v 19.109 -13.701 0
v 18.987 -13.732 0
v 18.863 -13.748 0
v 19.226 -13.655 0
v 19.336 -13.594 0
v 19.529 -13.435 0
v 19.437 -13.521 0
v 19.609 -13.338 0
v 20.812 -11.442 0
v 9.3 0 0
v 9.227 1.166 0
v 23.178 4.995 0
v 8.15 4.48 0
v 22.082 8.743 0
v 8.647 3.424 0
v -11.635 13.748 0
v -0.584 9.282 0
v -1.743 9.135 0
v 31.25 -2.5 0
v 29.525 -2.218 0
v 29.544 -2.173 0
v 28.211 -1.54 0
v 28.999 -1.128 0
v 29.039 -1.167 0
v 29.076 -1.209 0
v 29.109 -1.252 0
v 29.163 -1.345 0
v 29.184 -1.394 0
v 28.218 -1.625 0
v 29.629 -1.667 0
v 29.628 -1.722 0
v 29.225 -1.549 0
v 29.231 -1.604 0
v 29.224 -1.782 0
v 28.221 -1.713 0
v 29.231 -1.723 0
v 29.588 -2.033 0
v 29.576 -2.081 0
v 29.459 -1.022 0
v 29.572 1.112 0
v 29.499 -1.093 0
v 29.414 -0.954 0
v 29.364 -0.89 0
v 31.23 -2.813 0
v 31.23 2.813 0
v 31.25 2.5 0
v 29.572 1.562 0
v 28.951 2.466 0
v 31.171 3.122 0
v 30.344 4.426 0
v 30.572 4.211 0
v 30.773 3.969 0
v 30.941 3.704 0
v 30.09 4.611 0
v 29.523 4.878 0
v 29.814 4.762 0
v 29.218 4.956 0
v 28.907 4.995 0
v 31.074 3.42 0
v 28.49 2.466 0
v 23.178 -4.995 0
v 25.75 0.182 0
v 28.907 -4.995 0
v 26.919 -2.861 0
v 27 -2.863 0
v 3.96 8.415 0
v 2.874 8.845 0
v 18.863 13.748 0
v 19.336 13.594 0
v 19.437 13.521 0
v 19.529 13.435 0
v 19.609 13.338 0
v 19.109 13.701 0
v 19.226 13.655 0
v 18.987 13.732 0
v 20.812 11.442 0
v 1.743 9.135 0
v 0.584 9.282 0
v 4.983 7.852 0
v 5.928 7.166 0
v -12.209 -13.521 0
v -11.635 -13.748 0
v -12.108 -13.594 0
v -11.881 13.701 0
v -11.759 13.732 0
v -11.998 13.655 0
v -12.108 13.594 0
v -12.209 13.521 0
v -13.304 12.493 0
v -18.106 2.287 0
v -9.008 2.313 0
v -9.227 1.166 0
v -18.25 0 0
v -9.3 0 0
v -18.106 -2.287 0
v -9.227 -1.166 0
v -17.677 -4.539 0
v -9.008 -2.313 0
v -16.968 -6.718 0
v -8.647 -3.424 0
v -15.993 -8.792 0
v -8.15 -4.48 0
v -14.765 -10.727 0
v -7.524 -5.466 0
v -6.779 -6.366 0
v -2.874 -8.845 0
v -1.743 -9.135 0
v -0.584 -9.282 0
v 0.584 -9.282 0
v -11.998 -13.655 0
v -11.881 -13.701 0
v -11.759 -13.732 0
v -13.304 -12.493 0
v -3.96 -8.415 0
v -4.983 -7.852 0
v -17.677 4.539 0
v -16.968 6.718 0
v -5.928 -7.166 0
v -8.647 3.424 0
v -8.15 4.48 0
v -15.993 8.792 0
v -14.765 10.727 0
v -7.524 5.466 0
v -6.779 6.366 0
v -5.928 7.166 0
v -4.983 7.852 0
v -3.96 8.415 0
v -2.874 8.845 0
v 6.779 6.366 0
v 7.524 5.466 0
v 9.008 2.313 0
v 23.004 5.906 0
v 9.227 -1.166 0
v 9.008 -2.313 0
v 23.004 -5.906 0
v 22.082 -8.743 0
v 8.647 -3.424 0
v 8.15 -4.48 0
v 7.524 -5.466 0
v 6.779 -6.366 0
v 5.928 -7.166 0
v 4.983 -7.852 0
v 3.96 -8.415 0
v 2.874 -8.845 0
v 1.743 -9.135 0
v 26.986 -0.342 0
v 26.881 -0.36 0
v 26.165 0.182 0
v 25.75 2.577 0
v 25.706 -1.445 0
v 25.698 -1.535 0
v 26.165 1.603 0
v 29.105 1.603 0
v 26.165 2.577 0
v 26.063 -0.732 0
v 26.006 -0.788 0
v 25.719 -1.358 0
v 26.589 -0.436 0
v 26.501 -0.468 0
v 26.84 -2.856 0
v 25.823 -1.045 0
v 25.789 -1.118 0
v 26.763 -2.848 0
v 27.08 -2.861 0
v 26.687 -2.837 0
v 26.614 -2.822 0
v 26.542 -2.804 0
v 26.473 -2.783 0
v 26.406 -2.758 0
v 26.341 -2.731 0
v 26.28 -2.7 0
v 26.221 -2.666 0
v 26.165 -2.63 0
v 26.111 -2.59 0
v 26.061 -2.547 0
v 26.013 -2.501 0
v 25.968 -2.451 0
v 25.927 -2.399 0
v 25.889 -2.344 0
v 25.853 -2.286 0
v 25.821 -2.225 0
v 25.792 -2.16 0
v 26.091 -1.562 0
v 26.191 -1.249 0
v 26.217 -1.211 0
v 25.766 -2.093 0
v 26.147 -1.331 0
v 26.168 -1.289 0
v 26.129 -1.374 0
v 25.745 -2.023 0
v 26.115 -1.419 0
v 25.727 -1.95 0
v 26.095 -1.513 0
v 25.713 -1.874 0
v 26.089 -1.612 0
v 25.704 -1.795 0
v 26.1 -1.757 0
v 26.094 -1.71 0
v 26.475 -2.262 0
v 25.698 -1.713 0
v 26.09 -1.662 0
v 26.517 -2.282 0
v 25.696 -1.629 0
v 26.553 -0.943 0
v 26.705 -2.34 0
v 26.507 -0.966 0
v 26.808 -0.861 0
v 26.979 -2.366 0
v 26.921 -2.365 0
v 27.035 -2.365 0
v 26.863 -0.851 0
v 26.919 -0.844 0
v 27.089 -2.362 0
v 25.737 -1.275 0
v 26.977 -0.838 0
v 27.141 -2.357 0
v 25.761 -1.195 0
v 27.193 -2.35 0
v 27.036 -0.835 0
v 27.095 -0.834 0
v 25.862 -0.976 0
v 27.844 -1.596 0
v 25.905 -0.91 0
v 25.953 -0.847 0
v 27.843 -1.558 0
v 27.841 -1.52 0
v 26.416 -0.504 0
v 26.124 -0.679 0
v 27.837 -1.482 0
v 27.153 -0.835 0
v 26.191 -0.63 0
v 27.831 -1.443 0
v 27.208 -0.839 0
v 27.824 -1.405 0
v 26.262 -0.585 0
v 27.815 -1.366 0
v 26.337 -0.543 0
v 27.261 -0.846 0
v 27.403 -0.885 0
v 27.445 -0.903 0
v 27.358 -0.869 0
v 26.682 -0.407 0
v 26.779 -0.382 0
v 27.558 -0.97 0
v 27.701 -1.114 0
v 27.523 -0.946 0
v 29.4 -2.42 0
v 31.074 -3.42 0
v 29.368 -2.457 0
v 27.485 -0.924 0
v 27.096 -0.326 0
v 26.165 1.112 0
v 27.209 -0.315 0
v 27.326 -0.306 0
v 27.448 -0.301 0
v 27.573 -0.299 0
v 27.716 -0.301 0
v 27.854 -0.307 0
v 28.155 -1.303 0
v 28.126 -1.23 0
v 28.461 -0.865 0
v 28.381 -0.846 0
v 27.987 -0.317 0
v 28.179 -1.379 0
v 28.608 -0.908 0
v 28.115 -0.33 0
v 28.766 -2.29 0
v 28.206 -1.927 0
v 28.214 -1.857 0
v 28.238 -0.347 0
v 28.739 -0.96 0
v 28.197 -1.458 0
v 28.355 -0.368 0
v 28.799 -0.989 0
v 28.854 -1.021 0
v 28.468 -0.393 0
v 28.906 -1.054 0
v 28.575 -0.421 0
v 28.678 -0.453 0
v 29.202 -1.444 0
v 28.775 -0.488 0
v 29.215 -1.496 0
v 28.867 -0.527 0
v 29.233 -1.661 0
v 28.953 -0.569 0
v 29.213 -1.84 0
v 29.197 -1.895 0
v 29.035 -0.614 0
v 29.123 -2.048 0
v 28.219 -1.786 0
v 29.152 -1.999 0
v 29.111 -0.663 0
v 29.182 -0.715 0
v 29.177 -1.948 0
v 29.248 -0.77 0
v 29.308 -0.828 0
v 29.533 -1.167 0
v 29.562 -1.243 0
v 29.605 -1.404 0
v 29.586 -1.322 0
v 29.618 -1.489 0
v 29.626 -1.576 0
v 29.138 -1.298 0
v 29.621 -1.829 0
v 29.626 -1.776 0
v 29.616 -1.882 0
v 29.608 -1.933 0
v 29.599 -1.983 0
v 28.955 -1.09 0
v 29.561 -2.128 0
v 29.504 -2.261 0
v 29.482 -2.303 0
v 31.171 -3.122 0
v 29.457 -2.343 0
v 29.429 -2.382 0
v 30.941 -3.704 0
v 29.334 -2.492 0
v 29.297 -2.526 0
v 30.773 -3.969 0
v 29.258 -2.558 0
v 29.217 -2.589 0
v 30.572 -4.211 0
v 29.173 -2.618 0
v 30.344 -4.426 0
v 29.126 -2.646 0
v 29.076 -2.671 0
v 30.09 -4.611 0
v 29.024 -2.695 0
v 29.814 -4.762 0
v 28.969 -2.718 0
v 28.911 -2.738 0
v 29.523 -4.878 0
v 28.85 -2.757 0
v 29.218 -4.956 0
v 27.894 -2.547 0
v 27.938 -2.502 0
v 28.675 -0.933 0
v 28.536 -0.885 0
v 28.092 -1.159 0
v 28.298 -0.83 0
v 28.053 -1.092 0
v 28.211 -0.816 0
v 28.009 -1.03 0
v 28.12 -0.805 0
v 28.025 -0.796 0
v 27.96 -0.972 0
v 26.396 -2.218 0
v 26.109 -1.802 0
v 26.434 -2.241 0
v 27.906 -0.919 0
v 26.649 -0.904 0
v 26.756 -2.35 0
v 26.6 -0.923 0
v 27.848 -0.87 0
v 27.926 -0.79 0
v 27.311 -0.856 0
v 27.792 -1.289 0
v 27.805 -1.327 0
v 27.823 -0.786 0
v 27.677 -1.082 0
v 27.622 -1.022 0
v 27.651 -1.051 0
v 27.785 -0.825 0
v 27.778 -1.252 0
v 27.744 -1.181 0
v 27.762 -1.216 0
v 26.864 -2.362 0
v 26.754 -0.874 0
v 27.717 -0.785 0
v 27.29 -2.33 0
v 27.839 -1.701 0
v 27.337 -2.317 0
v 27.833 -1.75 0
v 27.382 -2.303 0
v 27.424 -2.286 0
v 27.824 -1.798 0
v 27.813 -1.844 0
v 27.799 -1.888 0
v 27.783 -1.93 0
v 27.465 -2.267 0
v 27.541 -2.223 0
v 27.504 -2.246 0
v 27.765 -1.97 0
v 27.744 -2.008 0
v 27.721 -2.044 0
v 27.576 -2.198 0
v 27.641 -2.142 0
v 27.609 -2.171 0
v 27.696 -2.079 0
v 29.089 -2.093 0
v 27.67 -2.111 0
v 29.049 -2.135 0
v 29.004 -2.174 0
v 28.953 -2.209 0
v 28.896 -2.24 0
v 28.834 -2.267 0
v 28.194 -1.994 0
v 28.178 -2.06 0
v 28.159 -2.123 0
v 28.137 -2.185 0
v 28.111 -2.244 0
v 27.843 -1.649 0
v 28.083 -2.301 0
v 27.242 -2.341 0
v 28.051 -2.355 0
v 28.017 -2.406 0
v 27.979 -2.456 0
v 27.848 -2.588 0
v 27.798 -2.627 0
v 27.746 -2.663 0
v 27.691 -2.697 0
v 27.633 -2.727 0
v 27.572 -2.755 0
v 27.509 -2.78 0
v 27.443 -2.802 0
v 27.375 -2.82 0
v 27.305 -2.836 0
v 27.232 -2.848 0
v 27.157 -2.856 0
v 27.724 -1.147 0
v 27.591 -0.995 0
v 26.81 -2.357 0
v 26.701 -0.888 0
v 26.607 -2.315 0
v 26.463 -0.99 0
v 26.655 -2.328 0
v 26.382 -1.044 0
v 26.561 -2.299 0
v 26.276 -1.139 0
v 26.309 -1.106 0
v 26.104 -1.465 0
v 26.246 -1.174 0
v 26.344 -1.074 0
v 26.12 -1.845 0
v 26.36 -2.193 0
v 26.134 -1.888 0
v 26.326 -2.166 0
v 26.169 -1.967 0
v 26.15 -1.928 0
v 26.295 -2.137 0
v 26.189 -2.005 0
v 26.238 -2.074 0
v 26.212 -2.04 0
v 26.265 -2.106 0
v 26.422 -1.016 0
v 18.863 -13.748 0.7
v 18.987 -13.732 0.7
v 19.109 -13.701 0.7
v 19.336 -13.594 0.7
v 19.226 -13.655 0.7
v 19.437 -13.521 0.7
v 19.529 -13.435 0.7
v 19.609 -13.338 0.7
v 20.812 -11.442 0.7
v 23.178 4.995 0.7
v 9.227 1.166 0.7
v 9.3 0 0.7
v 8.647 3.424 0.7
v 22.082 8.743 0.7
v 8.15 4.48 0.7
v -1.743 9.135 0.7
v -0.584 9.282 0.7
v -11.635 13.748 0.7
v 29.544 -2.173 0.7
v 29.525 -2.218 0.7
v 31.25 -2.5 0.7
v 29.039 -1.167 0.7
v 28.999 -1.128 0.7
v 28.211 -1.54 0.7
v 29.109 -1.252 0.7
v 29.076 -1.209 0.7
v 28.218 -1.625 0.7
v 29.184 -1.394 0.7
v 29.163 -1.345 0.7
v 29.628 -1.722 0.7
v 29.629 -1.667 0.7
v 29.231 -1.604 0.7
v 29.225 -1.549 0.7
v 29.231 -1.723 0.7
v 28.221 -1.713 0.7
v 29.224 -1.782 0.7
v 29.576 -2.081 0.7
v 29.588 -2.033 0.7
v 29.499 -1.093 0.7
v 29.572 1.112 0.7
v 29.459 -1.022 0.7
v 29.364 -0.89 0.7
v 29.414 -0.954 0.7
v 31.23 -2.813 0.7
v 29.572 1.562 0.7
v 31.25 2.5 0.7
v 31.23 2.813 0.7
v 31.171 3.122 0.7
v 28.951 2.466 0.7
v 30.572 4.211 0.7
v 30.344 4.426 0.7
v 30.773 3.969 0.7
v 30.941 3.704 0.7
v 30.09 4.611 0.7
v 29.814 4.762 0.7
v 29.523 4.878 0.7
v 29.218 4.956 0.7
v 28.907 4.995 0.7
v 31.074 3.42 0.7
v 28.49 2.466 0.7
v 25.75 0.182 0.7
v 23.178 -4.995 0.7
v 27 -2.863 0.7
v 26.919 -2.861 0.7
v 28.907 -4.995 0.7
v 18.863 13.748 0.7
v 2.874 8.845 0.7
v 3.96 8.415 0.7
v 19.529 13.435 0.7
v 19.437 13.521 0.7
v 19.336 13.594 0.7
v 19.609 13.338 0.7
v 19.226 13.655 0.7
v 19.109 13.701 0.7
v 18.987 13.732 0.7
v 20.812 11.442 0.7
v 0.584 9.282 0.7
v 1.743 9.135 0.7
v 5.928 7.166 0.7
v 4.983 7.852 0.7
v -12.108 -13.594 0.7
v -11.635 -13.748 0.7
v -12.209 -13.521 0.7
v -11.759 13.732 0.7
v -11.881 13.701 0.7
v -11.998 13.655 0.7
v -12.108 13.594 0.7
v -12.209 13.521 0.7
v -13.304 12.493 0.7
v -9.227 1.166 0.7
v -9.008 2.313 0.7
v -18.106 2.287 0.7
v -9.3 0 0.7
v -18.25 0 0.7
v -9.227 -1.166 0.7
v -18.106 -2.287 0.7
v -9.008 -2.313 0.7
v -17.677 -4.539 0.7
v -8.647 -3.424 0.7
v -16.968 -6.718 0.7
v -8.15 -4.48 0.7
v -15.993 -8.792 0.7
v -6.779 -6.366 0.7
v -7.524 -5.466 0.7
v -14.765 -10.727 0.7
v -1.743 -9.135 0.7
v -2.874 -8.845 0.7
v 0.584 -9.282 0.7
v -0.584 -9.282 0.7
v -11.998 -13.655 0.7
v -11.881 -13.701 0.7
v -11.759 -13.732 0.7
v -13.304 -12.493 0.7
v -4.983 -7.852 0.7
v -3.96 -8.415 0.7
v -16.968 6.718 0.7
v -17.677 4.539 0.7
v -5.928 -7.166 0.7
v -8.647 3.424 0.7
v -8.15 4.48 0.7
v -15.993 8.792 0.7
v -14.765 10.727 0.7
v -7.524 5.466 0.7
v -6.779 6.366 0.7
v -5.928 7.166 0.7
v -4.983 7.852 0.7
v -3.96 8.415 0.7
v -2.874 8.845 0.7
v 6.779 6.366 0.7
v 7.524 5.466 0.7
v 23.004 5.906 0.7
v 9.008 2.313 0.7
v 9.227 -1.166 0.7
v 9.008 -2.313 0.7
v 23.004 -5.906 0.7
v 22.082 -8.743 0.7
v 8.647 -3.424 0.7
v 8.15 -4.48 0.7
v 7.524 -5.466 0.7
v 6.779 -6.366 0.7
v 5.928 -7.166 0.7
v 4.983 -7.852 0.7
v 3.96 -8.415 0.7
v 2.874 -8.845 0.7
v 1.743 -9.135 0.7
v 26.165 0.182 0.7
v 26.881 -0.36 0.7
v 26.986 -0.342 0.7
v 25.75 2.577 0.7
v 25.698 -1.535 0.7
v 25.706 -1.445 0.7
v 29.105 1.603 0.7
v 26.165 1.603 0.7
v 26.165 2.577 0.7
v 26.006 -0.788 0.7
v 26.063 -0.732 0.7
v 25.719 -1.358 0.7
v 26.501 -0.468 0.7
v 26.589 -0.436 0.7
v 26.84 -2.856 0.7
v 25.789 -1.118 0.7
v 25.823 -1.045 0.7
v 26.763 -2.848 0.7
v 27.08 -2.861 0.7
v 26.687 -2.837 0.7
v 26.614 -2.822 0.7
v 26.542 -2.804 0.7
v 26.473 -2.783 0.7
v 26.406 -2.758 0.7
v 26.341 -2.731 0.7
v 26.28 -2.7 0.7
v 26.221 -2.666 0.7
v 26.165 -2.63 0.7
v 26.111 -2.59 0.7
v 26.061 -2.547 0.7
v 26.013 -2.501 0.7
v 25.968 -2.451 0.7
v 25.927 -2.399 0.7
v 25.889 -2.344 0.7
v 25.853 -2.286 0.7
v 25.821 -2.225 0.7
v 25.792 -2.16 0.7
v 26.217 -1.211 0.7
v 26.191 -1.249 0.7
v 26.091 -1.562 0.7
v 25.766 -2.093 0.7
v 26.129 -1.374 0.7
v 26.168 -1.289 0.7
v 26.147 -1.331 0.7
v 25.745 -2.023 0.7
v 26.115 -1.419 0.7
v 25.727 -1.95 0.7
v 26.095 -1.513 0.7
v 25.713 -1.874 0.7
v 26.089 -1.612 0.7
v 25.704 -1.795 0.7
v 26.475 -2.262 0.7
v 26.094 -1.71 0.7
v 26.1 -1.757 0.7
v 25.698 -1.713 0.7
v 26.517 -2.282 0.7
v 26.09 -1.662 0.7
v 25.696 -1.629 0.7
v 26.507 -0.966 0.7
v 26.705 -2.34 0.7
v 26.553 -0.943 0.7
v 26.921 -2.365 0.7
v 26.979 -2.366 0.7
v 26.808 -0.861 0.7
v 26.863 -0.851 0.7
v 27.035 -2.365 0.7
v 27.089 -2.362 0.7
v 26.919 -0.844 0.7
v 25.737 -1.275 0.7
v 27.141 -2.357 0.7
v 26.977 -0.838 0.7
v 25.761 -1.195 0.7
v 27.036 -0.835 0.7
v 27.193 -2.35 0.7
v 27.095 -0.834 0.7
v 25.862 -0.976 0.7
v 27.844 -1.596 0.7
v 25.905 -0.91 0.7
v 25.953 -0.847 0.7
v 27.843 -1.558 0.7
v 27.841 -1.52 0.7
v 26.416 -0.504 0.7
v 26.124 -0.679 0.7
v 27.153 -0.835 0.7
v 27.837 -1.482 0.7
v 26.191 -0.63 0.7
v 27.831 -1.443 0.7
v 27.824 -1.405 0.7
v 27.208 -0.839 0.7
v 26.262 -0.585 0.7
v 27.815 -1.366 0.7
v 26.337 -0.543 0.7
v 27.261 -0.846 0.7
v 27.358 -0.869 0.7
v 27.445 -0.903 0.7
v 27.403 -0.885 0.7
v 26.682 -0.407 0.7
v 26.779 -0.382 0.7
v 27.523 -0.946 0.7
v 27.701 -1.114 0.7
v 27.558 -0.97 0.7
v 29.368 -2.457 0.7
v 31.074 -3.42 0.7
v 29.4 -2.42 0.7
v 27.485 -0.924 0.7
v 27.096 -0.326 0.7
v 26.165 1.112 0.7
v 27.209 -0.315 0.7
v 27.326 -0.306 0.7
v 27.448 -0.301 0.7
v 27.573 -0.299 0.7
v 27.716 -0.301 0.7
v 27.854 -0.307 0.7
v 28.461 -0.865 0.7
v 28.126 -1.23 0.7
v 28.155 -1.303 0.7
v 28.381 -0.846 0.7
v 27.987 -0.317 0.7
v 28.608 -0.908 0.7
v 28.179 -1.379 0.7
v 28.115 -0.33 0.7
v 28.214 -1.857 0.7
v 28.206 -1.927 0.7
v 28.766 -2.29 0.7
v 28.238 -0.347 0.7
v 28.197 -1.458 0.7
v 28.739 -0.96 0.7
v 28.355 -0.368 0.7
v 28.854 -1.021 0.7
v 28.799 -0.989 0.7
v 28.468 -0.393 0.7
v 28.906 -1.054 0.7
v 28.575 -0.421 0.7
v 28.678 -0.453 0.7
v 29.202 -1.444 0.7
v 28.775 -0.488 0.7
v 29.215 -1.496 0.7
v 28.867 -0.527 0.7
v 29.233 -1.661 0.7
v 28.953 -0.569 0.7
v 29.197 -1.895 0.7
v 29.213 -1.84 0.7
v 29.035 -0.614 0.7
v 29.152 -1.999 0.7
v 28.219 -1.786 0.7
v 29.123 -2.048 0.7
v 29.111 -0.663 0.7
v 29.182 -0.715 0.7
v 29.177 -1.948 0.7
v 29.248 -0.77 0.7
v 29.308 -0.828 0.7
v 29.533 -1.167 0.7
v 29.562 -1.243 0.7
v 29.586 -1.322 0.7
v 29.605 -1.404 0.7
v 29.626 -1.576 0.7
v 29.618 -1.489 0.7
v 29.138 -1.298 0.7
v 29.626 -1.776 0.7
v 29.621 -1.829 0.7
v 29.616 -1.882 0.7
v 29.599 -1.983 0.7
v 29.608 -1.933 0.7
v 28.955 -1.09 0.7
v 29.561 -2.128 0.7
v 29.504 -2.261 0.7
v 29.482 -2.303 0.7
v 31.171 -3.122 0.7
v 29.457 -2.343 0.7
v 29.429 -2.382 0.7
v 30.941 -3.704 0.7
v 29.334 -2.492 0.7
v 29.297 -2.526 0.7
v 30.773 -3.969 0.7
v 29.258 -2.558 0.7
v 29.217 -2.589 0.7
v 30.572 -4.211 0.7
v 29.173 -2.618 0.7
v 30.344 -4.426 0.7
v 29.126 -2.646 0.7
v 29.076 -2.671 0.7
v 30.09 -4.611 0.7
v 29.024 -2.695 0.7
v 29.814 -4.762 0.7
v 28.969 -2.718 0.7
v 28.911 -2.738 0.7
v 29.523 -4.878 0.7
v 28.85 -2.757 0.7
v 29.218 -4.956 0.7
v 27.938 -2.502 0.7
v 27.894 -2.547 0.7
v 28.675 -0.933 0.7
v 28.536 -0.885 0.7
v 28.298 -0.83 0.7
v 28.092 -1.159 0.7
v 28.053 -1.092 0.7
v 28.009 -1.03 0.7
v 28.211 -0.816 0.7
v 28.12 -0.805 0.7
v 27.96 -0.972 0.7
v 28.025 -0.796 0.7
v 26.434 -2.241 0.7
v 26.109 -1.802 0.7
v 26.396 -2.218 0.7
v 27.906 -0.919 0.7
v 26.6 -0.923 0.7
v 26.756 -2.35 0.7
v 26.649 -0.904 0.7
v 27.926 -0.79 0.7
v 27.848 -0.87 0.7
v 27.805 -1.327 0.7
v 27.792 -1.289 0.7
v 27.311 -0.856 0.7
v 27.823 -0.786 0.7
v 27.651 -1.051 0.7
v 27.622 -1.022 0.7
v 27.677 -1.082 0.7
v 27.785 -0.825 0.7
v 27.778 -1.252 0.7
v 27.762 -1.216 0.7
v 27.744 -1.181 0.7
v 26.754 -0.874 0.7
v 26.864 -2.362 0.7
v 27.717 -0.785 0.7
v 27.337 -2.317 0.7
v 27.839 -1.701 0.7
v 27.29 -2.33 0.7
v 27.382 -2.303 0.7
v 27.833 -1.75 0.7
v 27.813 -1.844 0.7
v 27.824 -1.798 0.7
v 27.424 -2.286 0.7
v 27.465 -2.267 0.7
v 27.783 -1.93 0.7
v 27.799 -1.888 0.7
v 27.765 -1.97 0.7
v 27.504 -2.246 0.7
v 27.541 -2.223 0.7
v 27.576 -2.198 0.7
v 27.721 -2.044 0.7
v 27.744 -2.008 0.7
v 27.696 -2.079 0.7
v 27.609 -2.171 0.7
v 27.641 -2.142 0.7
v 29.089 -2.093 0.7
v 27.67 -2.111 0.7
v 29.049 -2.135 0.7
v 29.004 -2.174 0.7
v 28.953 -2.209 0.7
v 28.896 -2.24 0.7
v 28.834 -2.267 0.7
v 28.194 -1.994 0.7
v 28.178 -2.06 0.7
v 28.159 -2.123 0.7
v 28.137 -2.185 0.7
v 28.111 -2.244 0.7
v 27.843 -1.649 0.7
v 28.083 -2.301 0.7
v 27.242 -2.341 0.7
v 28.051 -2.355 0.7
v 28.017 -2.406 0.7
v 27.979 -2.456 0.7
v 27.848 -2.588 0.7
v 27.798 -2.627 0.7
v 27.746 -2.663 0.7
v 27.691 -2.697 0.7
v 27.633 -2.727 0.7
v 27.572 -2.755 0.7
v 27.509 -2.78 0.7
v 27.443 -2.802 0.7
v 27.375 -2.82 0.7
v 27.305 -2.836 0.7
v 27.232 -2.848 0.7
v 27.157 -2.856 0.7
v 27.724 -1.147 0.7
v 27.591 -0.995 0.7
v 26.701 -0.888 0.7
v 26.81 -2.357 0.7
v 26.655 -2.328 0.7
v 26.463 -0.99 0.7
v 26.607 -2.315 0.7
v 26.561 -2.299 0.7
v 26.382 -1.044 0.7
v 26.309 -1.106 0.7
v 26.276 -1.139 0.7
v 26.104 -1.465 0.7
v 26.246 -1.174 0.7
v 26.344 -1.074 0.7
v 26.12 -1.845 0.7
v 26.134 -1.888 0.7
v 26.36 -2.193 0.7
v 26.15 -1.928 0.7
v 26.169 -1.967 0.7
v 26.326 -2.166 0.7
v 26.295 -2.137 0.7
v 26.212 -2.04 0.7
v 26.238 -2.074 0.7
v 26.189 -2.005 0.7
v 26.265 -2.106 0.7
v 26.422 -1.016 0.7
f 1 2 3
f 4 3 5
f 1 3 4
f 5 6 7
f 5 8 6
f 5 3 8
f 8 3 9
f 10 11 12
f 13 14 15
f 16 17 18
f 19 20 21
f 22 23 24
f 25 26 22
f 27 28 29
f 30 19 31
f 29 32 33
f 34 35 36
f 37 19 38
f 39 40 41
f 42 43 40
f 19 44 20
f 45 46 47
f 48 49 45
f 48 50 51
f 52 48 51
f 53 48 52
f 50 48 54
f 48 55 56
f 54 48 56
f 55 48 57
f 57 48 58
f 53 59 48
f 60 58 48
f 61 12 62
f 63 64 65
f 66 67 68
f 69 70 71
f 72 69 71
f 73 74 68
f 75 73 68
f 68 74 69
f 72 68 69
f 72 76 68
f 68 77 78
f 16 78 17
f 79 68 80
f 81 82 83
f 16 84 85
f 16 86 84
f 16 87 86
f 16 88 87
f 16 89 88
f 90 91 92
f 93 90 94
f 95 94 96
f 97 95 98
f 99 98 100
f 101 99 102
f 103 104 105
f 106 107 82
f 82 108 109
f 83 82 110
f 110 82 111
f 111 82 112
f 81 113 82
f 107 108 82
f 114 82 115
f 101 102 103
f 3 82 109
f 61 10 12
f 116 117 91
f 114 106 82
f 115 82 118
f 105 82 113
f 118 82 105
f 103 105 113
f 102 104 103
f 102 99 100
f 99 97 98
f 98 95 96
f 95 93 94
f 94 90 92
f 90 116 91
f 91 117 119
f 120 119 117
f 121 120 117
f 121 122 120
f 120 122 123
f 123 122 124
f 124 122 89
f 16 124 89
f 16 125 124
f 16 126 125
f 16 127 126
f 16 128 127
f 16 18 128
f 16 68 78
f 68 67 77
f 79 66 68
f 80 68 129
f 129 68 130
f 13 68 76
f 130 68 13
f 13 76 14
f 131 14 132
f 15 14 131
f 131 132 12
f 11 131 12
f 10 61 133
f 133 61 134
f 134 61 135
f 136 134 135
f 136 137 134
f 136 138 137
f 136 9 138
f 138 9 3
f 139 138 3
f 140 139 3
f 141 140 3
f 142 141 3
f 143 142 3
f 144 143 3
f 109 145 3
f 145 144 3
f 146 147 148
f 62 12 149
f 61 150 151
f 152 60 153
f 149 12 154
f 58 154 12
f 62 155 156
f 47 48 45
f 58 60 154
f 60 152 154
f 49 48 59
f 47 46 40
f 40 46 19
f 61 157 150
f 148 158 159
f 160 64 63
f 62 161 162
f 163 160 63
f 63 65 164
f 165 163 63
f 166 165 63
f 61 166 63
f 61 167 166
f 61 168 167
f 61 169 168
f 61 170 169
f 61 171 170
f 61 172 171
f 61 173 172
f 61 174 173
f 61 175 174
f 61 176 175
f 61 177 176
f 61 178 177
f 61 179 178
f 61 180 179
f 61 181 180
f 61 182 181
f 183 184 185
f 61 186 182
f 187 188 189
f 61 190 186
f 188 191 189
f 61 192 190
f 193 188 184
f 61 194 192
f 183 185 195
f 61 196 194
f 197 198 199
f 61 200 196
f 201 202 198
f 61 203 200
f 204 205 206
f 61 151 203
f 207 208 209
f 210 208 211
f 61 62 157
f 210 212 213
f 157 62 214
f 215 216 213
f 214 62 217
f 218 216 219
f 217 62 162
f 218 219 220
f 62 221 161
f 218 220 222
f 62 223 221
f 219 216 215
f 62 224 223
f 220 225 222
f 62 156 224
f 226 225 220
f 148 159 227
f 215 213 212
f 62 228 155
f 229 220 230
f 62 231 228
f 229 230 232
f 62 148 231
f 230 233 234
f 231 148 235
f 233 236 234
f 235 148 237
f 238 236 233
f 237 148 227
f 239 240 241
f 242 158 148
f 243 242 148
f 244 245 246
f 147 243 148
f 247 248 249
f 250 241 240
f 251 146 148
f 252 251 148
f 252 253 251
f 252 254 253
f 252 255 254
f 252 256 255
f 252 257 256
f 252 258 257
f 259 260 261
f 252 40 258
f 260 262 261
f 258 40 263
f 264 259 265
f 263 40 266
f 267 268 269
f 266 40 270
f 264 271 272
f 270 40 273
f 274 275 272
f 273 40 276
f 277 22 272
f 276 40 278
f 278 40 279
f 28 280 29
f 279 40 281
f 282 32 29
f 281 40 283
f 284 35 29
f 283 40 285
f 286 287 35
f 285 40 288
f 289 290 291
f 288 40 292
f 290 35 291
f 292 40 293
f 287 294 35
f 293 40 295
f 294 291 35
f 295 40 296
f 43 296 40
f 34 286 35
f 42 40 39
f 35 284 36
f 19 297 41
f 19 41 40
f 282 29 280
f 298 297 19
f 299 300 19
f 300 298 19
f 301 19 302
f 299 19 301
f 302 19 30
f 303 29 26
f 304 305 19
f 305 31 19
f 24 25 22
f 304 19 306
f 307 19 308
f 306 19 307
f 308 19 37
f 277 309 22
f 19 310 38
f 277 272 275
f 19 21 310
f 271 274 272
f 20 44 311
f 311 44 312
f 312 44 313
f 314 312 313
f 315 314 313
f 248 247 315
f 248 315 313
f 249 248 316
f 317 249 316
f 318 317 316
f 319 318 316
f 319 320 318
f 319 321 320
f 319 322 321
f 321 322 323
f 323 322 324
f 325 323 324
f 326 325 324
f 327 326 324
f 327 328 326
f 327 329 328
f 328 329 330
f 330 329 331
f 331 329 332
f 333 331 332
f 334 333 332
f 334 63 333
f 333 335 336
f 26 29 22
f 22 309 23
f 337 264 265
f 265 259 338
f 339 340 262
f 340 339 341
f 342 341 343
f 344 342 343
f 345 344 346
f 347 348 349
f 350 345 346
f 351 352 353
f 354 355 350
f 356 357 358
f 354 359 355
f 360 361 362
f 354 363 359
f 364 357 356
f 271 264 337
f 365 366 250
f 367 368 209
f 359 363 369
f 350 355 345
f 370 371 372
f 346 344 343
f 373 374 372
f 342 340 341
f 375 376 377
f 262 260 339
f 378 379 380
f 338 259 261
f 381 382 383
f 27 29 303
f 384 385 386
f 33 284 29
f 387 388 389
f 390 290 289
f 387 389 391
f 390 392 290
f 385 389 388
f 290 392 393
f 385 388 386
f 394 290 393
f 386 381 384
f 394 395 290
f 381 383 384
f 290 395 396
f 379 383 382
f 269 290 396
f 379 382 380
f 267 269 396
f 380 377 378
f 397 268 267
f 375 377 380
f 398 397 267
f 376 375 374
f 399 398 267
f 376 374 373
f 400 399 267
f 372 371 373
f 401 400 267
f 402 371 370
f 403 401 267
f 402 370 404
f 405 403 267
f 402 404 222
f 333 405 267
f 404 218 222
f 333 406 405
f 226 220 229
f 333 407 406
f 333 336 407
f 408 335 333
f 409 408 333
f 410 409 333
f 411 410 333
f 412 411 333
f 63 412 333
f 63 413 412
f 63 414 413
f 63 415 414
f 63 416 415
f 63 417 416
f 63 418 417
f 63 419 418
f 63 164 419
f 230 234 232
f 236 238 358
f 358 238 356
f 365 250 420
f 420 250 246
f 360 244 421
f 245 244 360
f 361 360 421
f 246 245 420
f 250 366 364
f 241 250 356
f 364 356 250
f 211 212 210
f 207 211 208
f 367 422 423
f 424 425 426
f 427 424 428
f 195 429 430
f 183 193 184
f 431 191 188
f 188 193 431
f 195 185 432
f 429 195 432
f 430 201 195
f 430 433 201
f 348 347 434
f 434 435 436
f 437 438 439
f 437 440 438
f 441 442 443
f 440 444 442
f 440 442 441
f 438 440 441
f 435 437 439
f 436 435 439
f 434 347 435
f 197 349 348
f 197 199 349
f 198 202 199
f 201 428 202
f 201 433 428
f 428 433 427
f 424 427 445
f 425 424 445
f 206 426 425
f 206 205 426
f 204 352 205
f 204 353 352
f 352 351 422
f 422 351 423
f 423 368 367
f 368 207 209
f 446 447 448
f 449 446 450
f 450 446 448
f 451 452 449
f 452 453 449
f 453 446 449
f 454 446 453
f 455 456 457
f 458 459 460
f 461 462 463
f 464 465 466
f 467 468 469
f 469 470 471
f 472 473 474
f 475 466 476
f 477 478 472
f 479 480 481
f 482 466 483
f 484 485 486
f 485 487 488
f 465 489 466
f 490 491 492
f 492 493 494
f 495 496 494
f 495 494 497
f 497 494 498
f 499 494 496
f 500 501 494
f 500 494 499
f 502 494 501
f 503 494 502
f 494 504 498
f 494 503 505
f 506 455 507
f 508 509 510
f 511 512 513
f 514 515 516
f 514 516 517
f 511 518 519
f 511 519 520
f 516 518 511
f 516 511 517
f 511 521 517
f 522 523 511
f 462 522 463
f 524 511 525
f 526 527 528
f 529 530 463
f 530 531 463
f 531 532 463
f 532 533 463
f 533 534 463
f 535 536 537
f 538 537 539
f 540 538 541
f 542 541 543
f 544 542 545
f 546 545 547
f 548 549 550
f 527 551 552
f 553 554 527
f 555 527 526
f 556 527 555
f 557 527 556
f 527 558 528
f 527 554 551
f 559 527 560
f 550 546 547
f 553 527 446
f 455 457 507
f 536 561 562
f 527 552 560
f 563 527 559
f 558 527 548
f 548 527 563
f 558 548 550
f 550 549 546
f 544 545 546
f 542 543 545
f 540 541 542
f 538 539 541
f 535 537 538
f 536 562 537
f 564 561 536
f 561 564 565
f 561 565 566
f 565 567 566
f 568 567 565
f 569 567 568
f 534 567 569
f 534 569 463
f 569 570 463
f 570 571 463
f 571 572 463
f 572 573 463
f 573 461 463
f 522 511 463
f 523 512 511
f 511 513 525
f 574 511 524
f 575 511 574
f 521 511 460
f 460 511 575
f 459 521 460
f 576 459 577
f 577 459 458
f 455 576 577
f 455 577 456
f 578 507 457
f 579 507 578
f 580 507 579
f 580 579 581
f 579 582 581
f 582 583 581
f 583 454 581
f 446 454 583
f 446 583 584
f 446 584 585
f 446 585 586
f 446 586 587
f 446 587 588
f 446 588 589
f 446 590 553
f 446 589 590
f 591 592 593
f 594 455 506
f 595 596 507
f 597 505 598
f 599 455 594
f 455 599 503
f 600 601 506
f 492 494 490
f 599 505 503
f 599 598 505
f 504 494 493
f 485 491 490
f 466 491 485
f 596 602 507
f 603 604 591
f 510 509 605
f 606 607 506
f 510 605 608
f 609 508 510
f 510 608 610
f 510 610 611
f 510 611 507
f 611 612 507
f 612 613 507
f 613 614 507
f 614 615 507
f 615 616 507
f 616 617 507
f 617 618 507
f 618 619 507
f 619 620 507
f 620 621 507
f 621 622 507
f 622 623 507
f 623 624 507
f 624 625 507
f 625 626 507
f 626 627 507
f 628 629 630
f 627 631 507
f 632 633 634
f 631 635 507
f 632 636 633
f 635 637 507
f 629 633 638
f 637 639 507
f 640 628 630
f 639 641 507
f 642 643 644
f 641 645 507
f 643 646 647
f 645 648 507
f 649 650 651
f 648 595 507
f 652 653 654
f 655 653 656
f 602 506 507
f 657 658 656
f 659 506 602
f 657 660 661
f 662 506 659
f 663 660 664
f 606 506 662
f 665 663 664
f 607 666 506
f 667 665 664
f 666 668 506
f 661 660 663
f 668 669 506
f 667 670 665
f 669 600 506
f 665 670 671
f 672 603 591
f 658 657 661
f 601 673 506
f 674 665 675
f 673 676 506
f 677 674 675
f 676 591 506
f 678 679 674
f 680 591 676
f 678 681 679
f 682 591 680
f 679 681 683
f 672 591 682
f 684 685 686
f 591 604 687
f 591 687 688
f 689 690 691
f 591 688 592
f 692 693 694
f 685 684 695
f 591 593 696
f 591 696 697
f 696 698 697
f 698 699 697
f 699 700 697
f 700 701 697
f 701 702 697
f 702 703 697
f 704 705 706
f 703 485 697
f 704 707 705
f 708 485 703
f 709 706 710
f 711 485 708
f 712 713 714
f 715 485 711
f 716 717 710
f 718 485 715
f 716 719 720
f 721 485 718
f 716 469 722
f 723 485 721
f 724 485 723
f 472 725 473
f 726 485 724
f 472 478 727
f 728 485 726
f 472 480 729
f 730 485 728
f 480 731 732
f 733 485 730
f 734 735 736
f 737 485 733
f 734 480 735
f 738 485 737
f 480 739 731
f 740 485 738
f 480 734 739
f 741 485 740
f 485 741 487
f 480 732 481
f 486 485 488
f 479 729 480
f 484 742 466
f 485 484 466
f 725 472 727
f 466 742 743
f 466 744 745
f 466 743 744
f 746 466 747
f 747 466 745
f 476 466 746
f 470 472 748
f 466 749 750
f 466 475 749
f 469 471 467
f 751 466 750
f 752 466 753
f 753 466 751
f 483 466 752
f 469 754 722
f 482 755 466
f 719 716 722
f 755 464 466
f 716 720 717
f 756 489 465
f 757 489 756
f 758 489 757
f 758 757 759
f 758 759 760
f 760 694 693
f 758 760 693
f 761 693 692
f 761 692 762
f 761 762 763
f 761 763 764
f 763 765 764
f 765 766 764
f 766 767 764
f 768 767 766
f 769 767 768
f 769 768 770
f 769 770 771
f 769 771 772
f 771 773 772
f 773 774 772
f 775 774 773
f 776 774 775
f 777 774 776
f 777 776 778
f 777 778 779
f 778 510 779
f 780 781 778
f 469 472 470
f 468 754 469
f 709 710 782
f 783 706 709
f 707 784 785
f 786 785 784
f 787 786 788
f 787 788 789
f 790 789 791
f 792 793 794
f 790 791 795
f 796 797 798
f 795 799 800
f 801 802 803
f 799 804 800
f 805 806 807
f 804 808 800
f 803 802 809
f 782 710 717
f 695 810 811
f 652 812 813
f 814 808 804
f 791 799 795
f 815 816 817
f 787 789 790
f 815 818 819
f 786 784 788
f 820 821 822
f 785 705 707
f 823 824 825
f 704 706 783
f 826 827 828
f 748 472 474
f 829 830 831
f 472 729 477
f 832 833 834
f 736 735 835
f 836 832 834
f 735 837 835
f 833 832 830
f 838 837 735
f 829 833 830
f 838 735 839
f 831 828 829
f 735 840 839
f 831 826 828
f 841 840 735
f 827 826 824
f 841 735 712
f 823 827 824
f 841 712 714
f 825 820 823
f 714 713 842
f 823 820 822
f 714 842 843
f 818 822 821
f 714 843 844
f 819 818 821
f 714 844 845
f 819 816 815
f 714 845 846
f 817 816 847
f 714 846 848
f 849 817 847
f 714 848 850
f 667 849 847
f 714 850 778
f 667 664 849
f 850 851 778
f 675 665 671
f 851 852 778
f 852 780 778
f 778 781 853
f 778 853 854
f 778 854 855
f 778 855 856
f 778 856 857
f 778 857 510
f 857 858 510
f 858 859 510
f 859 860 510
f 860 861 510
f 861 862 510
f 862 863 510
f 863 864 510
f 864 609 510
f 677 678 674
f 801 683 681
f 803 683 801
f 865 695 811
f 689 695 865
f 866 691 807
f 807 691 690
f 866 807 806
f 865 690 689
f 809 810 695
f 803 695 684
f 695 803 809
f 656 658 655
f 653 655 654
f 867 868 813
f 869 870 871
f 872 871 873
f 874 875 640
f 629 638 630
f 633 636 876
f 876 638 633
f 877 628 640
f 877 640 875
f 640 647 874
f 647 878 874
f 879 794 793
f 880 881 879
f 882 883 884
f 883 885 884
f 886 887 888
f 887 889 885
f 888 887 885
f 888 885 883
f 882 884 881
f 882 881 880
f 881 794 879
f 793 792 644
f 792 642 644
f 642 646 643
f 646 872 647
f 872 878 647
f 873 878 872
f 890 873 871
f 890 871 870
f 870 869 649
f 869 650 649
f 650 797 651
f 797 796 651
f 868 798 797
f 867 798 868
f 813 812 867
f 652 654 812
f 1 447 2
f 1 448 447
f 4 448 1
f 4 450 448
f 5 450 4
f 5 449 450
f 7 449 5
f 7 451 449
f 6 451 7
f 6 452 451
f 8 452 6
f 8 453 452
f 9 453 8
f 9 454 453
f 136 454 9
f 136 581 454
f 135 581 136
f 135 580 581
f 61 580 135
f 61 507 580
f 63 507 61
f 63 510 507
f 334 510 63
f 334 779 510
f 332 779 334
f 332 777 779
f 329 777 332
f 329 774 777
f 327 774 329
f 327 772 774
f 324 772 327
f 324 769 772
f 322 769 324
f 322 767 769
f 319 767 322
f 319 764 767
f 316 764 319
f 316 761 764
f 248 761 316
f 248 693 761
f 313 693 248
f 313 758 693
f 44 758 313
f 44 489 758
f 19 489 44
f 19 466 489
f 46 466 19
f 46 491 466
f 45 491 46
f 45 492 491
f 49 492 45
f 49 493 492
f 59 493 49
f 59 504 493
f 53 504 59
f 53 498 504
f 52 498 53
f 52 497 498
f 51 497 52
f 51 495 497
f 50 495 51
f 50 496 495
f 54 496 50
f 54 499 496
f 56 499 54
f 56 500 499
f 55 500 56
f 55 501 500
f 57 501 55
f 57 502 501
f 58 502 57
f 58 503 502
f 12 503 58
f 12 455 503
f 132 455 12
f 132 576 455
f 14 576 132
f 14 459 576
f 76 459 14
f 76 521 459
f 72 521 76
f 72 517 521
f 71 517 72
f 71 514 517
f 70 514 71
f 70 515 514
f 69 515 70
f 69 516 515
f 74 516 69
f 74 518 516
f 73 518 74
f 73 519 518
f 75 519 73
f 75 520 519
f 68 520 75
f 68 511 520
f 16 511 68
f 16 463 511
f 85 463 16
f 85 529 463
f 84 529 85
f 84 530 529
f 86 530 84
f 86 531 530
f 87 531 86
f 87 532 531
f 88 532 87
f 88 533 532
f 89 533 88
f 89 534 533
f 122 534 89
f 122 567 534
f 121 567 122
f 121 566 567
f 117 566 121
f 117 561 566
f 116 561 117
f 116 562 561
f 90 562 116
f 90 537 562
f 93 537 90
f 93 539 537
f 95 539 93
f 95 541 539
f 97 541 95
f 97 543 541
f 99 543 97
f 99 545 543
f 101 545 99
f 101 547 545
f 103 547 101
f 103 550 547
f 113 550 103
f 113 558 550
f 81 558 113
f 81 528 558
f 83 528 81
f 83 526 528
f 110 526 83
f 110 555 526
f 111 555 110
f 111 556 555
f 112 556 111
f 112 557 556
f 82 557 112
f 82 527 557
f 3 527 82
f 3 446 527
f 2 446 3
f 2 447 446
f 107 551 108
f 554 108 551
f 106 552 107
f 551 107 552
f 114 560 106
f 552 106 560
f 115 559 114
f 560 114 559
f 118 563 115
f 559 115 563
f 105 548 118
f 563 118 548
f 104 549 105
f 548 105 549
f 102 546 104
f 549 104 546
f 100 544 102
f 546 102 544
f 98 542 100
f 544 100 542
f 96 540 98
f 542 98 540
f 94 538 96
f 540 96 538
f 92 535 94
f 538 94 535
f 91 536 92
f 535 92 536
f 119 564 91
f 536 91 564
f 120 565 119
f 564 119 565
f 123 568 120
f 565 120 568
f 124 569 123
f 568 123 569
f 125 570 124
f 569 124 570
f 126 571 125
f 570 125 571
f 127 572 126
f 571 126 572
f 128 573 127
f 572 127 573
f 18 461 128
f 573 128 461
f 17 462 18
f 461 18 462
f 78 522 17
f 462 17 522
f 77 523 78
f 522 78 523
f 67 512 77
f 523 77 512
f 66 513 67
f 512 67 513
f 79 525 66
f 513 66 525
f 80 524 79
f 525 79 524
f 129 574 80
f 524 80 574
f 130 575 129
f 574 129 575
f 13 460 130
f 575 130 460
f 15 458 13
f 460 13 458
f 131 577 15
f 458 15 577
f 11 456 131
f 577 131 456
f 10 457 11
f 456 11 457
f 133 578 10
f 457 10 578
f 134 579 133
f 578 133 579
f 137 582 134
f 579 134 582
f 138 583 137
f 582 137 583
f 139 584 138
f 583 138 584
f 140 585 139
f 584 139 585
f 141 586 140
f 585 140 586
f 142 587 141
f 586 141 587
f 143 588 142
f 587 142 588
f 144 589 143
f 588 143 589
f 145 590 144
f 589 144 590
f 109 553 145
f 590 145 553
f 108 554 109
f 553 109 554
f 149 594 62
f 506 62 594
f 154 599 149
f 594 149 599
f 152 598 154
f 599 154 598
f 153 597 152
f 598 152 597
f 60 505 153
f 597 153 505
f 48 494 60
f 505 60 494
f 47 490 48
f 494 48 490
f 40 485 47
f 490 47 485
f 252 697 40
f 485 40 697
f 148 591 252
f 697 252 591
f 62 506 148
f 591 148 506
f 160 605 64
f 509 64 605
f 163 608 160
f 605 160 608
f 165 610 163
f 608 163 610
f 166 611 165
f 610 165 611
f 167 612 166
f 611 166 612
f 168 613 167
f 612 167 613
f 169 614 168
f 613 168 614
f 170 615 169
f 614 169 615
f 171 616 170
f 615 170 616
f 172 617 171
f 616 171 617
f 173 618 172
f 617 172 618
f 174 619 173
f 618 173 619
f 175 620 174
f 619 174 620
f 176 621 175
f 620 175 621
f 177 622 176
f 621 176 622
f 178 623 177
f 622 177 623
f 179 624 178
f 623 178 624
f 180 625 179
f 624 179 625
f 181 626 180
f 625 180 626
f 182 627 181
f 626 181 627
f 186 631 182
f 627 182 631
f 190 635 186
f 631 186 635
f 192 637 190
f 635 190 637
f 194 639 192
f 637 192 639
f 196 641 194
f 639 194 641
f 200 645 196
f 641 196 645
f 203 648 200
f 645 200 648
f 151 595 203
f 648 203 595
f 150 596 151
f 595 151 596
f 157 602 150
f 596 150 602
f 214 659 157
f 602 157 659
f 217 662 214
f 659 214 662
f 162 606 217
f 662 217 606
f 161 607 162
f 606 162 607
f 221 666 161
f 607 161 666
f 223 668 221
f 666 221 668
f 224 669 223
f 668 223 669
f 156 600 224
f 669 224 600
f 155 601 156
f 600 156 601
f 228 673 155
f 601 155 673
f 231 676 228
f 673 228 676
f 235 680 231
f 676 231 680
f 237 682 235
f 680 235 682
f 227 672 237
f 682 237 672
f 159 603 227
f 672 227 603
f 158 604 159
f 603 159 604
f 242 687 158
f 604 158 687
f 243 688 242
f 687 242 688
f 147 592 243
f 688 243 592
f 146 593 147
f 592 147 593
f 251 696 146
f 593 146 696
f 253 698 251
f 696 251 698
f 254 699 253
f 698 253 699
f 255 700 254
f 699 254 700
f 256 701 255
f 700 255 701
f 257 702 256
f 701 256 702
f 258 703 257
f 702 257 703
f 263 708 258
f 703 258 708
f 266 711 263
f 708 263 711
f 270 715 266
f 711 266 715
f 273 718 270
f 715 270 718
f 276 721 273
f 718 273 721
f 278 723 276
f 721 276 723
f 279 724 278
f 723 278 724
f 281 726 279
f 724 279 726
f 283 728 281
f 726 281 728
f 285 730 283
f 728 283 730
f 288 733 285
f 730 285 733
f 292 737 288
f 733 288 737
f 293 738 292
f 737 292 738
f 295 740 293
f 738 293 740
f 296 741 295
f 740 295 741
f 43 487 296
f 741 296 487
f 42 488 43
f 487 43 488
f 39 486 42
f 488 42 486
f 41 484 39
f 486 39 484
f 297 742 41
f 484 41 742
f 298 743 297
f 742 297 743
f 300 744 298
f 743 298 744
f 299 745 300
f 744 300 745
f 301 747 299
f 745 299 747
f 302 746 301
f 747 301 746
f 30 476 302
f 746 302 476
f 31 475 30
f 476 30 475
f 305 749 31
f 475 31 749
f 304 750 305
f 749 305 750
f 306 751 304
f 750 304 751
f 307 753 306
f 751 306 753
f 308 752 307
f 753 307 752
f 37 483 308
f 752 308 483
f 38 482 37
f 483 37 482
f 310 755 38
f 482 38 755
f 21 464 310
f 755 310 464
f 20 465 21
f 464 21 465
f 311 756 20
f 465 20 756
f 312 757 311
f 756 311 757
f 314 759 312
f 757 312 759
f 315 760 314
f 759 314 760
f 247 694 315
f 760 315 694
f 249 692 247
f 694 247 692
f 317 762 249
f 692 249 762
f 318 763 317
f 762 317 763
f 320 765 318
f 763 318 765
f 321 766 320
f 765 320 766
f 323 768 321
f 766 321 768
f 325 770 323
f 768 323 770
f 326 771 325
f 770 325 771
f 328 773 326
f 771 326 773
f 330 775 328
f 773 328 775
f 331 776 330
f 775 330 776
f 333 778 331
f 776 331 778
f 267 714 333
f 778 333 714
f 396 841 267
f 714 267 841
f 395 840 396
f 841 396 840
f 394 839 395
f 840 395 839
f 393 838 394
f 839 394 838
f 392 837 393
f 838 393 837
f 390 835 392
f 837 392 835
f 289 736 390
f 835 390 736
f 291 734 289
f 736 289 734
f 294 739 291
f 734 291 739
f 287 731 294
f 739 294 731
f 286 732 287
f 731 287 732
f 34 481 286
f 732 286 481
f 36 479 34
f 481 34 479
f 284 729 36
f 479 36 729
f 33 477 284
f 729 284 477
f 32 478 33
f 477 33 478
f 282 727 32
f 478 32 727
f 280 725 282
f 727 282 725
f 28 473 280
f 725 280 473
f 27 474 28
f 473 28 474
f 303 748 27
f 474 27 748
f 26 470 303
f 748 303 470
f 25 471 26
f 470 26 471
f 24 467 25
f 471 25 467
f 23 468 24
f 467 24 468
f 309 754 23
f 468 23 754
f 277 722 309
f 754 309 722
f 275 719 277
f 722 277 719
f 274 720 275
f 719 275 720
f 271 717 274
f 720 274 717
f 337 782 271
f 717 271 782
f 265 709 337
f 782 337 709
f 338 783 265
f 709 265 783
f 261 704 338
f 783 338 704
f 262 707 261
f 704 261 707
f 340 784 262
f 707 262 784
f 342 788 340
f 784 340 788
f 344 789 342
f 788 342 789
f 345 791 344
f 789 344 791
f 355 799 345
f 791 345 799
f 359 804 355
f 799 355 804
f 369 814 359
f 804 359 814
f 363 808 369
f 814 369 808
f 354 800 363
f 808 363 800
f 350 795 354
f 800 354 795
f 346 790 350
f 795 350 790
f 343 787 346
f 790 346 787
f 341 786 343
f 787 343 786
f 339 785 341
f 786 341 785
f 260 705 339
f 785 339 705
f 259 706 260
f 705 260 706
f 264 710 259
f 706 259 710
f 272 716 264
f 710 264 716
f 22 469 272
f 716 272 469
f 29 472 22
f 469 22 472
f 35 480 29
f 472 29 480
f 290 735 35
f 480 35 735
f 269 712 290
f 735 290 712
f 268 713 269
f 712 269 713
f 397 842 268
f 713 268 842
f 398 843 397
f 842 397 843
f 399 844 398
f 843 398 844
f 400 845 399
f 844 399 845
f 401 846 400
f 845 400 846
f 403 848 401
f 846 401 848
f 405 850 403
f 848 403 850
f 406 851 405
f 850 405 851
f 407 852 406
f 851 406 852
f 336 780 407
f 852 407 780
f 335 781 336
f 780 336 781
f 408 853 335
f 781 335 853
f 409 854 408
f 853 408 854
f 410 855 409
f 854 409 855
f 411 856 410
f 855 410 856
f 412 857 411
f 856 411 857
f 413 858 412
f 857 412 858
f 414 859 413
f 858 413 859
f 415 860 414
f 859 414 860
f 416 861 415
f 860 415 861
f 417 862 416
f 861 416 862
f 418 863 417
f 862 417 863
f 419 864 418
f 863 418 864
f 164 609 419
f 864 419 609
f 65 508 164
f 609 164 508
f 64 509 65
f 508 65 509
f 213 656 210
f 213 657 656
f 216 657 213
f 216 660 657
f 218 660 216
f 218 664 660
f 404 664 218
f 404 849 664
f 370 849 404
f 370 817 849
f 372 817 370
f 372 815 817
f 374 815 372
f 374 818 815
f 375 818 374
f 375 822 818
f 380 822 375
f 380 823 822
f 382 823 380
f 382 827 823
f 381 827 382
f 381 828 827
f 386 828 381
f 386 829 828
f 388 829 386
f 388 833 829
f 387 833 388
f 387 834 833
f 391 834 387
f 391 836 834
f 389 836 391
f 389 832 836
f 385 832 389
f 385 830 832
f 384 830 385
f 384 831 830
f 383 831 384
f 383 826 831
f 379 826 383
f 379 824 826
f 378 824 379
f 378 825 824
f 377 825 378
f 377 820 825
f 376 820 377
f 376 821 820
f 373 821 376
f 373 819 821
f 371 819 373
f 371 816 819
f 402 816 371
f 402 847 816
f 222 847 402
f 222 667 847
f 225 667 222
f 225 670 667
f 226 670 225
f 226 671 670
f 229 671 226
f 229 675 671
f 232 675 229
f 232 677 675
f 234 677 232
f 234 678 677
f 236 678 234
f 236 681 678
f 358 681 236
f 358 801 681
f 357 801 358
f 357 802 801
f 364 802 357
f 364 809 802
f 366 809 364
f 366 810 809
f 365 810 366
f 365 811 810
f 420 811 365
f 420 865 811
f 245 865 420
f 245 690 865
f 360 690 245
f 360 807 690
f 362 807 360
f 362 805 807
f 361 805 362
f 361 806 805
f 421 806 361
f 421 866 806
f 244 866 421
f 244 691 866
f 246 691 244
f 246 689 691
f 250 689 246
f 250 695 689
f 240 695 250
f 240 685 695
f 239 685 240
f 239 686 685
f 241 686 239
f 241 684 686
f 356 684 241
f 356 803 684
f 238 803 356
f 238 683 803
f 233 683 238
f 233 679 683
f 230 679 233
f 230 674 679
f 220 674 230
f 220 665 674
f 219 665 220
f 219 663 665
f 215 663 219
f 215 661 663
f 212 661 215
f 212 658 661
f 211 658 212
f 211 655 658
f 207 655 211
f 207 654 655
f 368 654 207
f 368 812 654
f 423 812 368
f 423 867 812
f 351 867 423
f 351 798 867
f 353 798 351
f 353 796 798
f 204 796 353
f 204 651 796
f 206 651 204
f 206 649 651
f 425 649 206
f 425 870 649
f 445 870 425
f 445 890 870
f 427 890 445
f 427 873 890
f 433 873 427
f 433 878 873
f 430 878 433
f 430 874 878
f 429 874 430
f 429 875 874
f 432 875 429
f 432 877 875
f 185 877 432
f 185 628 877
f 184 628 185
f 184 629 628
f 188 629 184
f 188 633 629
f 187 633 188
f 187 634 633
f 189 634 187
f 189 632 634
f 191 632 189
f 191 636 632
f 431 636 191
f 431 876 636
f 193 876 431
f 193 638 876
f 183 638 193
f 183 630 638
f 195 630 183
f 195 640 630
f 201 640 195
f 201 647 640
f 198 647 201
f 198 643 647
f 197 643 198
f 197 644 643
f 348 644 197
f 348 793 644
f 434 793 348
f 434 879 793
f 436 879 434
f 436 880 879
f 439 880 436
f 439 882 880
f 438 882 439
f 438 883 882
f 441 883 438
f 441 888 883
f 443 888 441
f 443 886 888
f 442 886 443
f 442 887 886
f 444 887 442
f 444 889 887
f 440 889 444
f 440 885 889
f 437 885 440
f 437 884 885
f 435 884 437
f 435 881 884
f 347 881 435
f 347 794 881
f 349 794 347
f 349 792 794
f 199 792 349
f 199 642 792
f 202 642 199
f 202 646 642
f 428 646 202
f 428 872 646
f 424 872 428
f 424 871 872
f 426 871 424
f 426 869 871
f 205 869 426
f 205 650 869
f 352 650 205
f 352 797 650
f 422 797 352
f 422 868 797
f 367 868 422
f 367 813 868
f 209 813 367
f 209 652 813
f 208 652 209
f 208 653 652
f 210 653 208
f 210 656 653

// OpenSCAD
D = 47.5;
d = 36.5;
W = 27.5;


module apperture_2d_body() {
    rnd = 2;
    minkowski() {
        union() {
            intersection() {
                circle(d=D-rnd);
                translate([D/2, 0])
                    square([D, W-rnd], center=true);
            }
            intersection() {
                circle(d=d-rnd);
                translate([-D/2, 0])
                    square([D, W-rnd], center=true);
            }
        }
        circle(d=rnd);
    }
}

module apperture_2d_with_handle(text) {
    handle_w = 10;
    font_size = 4;
    rnd = 5;
    difference() {
        union() {
            translate([D/2,0])
                minkowski() {
                    square([handle_w*2-2*rnd, handle_w-rnd], center=true);
                    circle(d=rnd);
                }
            apperture_2d_body();
        }
        translate([D/2+font_size/2, 3])
        rotate(-90)
            text(text, size = font_size);
    }
}

module apperture_2d(name, int_dia) {
    difference() {
        apperture_2d_with_handle(name);
        circle(d=int_dia);
    }
}

module test_print() {
    linear_extrude(height=0.7)
        apperture_2d("16", 18.6);
}

$fn = 50;
//apperture_2d("16", 18.6);
test_print();
